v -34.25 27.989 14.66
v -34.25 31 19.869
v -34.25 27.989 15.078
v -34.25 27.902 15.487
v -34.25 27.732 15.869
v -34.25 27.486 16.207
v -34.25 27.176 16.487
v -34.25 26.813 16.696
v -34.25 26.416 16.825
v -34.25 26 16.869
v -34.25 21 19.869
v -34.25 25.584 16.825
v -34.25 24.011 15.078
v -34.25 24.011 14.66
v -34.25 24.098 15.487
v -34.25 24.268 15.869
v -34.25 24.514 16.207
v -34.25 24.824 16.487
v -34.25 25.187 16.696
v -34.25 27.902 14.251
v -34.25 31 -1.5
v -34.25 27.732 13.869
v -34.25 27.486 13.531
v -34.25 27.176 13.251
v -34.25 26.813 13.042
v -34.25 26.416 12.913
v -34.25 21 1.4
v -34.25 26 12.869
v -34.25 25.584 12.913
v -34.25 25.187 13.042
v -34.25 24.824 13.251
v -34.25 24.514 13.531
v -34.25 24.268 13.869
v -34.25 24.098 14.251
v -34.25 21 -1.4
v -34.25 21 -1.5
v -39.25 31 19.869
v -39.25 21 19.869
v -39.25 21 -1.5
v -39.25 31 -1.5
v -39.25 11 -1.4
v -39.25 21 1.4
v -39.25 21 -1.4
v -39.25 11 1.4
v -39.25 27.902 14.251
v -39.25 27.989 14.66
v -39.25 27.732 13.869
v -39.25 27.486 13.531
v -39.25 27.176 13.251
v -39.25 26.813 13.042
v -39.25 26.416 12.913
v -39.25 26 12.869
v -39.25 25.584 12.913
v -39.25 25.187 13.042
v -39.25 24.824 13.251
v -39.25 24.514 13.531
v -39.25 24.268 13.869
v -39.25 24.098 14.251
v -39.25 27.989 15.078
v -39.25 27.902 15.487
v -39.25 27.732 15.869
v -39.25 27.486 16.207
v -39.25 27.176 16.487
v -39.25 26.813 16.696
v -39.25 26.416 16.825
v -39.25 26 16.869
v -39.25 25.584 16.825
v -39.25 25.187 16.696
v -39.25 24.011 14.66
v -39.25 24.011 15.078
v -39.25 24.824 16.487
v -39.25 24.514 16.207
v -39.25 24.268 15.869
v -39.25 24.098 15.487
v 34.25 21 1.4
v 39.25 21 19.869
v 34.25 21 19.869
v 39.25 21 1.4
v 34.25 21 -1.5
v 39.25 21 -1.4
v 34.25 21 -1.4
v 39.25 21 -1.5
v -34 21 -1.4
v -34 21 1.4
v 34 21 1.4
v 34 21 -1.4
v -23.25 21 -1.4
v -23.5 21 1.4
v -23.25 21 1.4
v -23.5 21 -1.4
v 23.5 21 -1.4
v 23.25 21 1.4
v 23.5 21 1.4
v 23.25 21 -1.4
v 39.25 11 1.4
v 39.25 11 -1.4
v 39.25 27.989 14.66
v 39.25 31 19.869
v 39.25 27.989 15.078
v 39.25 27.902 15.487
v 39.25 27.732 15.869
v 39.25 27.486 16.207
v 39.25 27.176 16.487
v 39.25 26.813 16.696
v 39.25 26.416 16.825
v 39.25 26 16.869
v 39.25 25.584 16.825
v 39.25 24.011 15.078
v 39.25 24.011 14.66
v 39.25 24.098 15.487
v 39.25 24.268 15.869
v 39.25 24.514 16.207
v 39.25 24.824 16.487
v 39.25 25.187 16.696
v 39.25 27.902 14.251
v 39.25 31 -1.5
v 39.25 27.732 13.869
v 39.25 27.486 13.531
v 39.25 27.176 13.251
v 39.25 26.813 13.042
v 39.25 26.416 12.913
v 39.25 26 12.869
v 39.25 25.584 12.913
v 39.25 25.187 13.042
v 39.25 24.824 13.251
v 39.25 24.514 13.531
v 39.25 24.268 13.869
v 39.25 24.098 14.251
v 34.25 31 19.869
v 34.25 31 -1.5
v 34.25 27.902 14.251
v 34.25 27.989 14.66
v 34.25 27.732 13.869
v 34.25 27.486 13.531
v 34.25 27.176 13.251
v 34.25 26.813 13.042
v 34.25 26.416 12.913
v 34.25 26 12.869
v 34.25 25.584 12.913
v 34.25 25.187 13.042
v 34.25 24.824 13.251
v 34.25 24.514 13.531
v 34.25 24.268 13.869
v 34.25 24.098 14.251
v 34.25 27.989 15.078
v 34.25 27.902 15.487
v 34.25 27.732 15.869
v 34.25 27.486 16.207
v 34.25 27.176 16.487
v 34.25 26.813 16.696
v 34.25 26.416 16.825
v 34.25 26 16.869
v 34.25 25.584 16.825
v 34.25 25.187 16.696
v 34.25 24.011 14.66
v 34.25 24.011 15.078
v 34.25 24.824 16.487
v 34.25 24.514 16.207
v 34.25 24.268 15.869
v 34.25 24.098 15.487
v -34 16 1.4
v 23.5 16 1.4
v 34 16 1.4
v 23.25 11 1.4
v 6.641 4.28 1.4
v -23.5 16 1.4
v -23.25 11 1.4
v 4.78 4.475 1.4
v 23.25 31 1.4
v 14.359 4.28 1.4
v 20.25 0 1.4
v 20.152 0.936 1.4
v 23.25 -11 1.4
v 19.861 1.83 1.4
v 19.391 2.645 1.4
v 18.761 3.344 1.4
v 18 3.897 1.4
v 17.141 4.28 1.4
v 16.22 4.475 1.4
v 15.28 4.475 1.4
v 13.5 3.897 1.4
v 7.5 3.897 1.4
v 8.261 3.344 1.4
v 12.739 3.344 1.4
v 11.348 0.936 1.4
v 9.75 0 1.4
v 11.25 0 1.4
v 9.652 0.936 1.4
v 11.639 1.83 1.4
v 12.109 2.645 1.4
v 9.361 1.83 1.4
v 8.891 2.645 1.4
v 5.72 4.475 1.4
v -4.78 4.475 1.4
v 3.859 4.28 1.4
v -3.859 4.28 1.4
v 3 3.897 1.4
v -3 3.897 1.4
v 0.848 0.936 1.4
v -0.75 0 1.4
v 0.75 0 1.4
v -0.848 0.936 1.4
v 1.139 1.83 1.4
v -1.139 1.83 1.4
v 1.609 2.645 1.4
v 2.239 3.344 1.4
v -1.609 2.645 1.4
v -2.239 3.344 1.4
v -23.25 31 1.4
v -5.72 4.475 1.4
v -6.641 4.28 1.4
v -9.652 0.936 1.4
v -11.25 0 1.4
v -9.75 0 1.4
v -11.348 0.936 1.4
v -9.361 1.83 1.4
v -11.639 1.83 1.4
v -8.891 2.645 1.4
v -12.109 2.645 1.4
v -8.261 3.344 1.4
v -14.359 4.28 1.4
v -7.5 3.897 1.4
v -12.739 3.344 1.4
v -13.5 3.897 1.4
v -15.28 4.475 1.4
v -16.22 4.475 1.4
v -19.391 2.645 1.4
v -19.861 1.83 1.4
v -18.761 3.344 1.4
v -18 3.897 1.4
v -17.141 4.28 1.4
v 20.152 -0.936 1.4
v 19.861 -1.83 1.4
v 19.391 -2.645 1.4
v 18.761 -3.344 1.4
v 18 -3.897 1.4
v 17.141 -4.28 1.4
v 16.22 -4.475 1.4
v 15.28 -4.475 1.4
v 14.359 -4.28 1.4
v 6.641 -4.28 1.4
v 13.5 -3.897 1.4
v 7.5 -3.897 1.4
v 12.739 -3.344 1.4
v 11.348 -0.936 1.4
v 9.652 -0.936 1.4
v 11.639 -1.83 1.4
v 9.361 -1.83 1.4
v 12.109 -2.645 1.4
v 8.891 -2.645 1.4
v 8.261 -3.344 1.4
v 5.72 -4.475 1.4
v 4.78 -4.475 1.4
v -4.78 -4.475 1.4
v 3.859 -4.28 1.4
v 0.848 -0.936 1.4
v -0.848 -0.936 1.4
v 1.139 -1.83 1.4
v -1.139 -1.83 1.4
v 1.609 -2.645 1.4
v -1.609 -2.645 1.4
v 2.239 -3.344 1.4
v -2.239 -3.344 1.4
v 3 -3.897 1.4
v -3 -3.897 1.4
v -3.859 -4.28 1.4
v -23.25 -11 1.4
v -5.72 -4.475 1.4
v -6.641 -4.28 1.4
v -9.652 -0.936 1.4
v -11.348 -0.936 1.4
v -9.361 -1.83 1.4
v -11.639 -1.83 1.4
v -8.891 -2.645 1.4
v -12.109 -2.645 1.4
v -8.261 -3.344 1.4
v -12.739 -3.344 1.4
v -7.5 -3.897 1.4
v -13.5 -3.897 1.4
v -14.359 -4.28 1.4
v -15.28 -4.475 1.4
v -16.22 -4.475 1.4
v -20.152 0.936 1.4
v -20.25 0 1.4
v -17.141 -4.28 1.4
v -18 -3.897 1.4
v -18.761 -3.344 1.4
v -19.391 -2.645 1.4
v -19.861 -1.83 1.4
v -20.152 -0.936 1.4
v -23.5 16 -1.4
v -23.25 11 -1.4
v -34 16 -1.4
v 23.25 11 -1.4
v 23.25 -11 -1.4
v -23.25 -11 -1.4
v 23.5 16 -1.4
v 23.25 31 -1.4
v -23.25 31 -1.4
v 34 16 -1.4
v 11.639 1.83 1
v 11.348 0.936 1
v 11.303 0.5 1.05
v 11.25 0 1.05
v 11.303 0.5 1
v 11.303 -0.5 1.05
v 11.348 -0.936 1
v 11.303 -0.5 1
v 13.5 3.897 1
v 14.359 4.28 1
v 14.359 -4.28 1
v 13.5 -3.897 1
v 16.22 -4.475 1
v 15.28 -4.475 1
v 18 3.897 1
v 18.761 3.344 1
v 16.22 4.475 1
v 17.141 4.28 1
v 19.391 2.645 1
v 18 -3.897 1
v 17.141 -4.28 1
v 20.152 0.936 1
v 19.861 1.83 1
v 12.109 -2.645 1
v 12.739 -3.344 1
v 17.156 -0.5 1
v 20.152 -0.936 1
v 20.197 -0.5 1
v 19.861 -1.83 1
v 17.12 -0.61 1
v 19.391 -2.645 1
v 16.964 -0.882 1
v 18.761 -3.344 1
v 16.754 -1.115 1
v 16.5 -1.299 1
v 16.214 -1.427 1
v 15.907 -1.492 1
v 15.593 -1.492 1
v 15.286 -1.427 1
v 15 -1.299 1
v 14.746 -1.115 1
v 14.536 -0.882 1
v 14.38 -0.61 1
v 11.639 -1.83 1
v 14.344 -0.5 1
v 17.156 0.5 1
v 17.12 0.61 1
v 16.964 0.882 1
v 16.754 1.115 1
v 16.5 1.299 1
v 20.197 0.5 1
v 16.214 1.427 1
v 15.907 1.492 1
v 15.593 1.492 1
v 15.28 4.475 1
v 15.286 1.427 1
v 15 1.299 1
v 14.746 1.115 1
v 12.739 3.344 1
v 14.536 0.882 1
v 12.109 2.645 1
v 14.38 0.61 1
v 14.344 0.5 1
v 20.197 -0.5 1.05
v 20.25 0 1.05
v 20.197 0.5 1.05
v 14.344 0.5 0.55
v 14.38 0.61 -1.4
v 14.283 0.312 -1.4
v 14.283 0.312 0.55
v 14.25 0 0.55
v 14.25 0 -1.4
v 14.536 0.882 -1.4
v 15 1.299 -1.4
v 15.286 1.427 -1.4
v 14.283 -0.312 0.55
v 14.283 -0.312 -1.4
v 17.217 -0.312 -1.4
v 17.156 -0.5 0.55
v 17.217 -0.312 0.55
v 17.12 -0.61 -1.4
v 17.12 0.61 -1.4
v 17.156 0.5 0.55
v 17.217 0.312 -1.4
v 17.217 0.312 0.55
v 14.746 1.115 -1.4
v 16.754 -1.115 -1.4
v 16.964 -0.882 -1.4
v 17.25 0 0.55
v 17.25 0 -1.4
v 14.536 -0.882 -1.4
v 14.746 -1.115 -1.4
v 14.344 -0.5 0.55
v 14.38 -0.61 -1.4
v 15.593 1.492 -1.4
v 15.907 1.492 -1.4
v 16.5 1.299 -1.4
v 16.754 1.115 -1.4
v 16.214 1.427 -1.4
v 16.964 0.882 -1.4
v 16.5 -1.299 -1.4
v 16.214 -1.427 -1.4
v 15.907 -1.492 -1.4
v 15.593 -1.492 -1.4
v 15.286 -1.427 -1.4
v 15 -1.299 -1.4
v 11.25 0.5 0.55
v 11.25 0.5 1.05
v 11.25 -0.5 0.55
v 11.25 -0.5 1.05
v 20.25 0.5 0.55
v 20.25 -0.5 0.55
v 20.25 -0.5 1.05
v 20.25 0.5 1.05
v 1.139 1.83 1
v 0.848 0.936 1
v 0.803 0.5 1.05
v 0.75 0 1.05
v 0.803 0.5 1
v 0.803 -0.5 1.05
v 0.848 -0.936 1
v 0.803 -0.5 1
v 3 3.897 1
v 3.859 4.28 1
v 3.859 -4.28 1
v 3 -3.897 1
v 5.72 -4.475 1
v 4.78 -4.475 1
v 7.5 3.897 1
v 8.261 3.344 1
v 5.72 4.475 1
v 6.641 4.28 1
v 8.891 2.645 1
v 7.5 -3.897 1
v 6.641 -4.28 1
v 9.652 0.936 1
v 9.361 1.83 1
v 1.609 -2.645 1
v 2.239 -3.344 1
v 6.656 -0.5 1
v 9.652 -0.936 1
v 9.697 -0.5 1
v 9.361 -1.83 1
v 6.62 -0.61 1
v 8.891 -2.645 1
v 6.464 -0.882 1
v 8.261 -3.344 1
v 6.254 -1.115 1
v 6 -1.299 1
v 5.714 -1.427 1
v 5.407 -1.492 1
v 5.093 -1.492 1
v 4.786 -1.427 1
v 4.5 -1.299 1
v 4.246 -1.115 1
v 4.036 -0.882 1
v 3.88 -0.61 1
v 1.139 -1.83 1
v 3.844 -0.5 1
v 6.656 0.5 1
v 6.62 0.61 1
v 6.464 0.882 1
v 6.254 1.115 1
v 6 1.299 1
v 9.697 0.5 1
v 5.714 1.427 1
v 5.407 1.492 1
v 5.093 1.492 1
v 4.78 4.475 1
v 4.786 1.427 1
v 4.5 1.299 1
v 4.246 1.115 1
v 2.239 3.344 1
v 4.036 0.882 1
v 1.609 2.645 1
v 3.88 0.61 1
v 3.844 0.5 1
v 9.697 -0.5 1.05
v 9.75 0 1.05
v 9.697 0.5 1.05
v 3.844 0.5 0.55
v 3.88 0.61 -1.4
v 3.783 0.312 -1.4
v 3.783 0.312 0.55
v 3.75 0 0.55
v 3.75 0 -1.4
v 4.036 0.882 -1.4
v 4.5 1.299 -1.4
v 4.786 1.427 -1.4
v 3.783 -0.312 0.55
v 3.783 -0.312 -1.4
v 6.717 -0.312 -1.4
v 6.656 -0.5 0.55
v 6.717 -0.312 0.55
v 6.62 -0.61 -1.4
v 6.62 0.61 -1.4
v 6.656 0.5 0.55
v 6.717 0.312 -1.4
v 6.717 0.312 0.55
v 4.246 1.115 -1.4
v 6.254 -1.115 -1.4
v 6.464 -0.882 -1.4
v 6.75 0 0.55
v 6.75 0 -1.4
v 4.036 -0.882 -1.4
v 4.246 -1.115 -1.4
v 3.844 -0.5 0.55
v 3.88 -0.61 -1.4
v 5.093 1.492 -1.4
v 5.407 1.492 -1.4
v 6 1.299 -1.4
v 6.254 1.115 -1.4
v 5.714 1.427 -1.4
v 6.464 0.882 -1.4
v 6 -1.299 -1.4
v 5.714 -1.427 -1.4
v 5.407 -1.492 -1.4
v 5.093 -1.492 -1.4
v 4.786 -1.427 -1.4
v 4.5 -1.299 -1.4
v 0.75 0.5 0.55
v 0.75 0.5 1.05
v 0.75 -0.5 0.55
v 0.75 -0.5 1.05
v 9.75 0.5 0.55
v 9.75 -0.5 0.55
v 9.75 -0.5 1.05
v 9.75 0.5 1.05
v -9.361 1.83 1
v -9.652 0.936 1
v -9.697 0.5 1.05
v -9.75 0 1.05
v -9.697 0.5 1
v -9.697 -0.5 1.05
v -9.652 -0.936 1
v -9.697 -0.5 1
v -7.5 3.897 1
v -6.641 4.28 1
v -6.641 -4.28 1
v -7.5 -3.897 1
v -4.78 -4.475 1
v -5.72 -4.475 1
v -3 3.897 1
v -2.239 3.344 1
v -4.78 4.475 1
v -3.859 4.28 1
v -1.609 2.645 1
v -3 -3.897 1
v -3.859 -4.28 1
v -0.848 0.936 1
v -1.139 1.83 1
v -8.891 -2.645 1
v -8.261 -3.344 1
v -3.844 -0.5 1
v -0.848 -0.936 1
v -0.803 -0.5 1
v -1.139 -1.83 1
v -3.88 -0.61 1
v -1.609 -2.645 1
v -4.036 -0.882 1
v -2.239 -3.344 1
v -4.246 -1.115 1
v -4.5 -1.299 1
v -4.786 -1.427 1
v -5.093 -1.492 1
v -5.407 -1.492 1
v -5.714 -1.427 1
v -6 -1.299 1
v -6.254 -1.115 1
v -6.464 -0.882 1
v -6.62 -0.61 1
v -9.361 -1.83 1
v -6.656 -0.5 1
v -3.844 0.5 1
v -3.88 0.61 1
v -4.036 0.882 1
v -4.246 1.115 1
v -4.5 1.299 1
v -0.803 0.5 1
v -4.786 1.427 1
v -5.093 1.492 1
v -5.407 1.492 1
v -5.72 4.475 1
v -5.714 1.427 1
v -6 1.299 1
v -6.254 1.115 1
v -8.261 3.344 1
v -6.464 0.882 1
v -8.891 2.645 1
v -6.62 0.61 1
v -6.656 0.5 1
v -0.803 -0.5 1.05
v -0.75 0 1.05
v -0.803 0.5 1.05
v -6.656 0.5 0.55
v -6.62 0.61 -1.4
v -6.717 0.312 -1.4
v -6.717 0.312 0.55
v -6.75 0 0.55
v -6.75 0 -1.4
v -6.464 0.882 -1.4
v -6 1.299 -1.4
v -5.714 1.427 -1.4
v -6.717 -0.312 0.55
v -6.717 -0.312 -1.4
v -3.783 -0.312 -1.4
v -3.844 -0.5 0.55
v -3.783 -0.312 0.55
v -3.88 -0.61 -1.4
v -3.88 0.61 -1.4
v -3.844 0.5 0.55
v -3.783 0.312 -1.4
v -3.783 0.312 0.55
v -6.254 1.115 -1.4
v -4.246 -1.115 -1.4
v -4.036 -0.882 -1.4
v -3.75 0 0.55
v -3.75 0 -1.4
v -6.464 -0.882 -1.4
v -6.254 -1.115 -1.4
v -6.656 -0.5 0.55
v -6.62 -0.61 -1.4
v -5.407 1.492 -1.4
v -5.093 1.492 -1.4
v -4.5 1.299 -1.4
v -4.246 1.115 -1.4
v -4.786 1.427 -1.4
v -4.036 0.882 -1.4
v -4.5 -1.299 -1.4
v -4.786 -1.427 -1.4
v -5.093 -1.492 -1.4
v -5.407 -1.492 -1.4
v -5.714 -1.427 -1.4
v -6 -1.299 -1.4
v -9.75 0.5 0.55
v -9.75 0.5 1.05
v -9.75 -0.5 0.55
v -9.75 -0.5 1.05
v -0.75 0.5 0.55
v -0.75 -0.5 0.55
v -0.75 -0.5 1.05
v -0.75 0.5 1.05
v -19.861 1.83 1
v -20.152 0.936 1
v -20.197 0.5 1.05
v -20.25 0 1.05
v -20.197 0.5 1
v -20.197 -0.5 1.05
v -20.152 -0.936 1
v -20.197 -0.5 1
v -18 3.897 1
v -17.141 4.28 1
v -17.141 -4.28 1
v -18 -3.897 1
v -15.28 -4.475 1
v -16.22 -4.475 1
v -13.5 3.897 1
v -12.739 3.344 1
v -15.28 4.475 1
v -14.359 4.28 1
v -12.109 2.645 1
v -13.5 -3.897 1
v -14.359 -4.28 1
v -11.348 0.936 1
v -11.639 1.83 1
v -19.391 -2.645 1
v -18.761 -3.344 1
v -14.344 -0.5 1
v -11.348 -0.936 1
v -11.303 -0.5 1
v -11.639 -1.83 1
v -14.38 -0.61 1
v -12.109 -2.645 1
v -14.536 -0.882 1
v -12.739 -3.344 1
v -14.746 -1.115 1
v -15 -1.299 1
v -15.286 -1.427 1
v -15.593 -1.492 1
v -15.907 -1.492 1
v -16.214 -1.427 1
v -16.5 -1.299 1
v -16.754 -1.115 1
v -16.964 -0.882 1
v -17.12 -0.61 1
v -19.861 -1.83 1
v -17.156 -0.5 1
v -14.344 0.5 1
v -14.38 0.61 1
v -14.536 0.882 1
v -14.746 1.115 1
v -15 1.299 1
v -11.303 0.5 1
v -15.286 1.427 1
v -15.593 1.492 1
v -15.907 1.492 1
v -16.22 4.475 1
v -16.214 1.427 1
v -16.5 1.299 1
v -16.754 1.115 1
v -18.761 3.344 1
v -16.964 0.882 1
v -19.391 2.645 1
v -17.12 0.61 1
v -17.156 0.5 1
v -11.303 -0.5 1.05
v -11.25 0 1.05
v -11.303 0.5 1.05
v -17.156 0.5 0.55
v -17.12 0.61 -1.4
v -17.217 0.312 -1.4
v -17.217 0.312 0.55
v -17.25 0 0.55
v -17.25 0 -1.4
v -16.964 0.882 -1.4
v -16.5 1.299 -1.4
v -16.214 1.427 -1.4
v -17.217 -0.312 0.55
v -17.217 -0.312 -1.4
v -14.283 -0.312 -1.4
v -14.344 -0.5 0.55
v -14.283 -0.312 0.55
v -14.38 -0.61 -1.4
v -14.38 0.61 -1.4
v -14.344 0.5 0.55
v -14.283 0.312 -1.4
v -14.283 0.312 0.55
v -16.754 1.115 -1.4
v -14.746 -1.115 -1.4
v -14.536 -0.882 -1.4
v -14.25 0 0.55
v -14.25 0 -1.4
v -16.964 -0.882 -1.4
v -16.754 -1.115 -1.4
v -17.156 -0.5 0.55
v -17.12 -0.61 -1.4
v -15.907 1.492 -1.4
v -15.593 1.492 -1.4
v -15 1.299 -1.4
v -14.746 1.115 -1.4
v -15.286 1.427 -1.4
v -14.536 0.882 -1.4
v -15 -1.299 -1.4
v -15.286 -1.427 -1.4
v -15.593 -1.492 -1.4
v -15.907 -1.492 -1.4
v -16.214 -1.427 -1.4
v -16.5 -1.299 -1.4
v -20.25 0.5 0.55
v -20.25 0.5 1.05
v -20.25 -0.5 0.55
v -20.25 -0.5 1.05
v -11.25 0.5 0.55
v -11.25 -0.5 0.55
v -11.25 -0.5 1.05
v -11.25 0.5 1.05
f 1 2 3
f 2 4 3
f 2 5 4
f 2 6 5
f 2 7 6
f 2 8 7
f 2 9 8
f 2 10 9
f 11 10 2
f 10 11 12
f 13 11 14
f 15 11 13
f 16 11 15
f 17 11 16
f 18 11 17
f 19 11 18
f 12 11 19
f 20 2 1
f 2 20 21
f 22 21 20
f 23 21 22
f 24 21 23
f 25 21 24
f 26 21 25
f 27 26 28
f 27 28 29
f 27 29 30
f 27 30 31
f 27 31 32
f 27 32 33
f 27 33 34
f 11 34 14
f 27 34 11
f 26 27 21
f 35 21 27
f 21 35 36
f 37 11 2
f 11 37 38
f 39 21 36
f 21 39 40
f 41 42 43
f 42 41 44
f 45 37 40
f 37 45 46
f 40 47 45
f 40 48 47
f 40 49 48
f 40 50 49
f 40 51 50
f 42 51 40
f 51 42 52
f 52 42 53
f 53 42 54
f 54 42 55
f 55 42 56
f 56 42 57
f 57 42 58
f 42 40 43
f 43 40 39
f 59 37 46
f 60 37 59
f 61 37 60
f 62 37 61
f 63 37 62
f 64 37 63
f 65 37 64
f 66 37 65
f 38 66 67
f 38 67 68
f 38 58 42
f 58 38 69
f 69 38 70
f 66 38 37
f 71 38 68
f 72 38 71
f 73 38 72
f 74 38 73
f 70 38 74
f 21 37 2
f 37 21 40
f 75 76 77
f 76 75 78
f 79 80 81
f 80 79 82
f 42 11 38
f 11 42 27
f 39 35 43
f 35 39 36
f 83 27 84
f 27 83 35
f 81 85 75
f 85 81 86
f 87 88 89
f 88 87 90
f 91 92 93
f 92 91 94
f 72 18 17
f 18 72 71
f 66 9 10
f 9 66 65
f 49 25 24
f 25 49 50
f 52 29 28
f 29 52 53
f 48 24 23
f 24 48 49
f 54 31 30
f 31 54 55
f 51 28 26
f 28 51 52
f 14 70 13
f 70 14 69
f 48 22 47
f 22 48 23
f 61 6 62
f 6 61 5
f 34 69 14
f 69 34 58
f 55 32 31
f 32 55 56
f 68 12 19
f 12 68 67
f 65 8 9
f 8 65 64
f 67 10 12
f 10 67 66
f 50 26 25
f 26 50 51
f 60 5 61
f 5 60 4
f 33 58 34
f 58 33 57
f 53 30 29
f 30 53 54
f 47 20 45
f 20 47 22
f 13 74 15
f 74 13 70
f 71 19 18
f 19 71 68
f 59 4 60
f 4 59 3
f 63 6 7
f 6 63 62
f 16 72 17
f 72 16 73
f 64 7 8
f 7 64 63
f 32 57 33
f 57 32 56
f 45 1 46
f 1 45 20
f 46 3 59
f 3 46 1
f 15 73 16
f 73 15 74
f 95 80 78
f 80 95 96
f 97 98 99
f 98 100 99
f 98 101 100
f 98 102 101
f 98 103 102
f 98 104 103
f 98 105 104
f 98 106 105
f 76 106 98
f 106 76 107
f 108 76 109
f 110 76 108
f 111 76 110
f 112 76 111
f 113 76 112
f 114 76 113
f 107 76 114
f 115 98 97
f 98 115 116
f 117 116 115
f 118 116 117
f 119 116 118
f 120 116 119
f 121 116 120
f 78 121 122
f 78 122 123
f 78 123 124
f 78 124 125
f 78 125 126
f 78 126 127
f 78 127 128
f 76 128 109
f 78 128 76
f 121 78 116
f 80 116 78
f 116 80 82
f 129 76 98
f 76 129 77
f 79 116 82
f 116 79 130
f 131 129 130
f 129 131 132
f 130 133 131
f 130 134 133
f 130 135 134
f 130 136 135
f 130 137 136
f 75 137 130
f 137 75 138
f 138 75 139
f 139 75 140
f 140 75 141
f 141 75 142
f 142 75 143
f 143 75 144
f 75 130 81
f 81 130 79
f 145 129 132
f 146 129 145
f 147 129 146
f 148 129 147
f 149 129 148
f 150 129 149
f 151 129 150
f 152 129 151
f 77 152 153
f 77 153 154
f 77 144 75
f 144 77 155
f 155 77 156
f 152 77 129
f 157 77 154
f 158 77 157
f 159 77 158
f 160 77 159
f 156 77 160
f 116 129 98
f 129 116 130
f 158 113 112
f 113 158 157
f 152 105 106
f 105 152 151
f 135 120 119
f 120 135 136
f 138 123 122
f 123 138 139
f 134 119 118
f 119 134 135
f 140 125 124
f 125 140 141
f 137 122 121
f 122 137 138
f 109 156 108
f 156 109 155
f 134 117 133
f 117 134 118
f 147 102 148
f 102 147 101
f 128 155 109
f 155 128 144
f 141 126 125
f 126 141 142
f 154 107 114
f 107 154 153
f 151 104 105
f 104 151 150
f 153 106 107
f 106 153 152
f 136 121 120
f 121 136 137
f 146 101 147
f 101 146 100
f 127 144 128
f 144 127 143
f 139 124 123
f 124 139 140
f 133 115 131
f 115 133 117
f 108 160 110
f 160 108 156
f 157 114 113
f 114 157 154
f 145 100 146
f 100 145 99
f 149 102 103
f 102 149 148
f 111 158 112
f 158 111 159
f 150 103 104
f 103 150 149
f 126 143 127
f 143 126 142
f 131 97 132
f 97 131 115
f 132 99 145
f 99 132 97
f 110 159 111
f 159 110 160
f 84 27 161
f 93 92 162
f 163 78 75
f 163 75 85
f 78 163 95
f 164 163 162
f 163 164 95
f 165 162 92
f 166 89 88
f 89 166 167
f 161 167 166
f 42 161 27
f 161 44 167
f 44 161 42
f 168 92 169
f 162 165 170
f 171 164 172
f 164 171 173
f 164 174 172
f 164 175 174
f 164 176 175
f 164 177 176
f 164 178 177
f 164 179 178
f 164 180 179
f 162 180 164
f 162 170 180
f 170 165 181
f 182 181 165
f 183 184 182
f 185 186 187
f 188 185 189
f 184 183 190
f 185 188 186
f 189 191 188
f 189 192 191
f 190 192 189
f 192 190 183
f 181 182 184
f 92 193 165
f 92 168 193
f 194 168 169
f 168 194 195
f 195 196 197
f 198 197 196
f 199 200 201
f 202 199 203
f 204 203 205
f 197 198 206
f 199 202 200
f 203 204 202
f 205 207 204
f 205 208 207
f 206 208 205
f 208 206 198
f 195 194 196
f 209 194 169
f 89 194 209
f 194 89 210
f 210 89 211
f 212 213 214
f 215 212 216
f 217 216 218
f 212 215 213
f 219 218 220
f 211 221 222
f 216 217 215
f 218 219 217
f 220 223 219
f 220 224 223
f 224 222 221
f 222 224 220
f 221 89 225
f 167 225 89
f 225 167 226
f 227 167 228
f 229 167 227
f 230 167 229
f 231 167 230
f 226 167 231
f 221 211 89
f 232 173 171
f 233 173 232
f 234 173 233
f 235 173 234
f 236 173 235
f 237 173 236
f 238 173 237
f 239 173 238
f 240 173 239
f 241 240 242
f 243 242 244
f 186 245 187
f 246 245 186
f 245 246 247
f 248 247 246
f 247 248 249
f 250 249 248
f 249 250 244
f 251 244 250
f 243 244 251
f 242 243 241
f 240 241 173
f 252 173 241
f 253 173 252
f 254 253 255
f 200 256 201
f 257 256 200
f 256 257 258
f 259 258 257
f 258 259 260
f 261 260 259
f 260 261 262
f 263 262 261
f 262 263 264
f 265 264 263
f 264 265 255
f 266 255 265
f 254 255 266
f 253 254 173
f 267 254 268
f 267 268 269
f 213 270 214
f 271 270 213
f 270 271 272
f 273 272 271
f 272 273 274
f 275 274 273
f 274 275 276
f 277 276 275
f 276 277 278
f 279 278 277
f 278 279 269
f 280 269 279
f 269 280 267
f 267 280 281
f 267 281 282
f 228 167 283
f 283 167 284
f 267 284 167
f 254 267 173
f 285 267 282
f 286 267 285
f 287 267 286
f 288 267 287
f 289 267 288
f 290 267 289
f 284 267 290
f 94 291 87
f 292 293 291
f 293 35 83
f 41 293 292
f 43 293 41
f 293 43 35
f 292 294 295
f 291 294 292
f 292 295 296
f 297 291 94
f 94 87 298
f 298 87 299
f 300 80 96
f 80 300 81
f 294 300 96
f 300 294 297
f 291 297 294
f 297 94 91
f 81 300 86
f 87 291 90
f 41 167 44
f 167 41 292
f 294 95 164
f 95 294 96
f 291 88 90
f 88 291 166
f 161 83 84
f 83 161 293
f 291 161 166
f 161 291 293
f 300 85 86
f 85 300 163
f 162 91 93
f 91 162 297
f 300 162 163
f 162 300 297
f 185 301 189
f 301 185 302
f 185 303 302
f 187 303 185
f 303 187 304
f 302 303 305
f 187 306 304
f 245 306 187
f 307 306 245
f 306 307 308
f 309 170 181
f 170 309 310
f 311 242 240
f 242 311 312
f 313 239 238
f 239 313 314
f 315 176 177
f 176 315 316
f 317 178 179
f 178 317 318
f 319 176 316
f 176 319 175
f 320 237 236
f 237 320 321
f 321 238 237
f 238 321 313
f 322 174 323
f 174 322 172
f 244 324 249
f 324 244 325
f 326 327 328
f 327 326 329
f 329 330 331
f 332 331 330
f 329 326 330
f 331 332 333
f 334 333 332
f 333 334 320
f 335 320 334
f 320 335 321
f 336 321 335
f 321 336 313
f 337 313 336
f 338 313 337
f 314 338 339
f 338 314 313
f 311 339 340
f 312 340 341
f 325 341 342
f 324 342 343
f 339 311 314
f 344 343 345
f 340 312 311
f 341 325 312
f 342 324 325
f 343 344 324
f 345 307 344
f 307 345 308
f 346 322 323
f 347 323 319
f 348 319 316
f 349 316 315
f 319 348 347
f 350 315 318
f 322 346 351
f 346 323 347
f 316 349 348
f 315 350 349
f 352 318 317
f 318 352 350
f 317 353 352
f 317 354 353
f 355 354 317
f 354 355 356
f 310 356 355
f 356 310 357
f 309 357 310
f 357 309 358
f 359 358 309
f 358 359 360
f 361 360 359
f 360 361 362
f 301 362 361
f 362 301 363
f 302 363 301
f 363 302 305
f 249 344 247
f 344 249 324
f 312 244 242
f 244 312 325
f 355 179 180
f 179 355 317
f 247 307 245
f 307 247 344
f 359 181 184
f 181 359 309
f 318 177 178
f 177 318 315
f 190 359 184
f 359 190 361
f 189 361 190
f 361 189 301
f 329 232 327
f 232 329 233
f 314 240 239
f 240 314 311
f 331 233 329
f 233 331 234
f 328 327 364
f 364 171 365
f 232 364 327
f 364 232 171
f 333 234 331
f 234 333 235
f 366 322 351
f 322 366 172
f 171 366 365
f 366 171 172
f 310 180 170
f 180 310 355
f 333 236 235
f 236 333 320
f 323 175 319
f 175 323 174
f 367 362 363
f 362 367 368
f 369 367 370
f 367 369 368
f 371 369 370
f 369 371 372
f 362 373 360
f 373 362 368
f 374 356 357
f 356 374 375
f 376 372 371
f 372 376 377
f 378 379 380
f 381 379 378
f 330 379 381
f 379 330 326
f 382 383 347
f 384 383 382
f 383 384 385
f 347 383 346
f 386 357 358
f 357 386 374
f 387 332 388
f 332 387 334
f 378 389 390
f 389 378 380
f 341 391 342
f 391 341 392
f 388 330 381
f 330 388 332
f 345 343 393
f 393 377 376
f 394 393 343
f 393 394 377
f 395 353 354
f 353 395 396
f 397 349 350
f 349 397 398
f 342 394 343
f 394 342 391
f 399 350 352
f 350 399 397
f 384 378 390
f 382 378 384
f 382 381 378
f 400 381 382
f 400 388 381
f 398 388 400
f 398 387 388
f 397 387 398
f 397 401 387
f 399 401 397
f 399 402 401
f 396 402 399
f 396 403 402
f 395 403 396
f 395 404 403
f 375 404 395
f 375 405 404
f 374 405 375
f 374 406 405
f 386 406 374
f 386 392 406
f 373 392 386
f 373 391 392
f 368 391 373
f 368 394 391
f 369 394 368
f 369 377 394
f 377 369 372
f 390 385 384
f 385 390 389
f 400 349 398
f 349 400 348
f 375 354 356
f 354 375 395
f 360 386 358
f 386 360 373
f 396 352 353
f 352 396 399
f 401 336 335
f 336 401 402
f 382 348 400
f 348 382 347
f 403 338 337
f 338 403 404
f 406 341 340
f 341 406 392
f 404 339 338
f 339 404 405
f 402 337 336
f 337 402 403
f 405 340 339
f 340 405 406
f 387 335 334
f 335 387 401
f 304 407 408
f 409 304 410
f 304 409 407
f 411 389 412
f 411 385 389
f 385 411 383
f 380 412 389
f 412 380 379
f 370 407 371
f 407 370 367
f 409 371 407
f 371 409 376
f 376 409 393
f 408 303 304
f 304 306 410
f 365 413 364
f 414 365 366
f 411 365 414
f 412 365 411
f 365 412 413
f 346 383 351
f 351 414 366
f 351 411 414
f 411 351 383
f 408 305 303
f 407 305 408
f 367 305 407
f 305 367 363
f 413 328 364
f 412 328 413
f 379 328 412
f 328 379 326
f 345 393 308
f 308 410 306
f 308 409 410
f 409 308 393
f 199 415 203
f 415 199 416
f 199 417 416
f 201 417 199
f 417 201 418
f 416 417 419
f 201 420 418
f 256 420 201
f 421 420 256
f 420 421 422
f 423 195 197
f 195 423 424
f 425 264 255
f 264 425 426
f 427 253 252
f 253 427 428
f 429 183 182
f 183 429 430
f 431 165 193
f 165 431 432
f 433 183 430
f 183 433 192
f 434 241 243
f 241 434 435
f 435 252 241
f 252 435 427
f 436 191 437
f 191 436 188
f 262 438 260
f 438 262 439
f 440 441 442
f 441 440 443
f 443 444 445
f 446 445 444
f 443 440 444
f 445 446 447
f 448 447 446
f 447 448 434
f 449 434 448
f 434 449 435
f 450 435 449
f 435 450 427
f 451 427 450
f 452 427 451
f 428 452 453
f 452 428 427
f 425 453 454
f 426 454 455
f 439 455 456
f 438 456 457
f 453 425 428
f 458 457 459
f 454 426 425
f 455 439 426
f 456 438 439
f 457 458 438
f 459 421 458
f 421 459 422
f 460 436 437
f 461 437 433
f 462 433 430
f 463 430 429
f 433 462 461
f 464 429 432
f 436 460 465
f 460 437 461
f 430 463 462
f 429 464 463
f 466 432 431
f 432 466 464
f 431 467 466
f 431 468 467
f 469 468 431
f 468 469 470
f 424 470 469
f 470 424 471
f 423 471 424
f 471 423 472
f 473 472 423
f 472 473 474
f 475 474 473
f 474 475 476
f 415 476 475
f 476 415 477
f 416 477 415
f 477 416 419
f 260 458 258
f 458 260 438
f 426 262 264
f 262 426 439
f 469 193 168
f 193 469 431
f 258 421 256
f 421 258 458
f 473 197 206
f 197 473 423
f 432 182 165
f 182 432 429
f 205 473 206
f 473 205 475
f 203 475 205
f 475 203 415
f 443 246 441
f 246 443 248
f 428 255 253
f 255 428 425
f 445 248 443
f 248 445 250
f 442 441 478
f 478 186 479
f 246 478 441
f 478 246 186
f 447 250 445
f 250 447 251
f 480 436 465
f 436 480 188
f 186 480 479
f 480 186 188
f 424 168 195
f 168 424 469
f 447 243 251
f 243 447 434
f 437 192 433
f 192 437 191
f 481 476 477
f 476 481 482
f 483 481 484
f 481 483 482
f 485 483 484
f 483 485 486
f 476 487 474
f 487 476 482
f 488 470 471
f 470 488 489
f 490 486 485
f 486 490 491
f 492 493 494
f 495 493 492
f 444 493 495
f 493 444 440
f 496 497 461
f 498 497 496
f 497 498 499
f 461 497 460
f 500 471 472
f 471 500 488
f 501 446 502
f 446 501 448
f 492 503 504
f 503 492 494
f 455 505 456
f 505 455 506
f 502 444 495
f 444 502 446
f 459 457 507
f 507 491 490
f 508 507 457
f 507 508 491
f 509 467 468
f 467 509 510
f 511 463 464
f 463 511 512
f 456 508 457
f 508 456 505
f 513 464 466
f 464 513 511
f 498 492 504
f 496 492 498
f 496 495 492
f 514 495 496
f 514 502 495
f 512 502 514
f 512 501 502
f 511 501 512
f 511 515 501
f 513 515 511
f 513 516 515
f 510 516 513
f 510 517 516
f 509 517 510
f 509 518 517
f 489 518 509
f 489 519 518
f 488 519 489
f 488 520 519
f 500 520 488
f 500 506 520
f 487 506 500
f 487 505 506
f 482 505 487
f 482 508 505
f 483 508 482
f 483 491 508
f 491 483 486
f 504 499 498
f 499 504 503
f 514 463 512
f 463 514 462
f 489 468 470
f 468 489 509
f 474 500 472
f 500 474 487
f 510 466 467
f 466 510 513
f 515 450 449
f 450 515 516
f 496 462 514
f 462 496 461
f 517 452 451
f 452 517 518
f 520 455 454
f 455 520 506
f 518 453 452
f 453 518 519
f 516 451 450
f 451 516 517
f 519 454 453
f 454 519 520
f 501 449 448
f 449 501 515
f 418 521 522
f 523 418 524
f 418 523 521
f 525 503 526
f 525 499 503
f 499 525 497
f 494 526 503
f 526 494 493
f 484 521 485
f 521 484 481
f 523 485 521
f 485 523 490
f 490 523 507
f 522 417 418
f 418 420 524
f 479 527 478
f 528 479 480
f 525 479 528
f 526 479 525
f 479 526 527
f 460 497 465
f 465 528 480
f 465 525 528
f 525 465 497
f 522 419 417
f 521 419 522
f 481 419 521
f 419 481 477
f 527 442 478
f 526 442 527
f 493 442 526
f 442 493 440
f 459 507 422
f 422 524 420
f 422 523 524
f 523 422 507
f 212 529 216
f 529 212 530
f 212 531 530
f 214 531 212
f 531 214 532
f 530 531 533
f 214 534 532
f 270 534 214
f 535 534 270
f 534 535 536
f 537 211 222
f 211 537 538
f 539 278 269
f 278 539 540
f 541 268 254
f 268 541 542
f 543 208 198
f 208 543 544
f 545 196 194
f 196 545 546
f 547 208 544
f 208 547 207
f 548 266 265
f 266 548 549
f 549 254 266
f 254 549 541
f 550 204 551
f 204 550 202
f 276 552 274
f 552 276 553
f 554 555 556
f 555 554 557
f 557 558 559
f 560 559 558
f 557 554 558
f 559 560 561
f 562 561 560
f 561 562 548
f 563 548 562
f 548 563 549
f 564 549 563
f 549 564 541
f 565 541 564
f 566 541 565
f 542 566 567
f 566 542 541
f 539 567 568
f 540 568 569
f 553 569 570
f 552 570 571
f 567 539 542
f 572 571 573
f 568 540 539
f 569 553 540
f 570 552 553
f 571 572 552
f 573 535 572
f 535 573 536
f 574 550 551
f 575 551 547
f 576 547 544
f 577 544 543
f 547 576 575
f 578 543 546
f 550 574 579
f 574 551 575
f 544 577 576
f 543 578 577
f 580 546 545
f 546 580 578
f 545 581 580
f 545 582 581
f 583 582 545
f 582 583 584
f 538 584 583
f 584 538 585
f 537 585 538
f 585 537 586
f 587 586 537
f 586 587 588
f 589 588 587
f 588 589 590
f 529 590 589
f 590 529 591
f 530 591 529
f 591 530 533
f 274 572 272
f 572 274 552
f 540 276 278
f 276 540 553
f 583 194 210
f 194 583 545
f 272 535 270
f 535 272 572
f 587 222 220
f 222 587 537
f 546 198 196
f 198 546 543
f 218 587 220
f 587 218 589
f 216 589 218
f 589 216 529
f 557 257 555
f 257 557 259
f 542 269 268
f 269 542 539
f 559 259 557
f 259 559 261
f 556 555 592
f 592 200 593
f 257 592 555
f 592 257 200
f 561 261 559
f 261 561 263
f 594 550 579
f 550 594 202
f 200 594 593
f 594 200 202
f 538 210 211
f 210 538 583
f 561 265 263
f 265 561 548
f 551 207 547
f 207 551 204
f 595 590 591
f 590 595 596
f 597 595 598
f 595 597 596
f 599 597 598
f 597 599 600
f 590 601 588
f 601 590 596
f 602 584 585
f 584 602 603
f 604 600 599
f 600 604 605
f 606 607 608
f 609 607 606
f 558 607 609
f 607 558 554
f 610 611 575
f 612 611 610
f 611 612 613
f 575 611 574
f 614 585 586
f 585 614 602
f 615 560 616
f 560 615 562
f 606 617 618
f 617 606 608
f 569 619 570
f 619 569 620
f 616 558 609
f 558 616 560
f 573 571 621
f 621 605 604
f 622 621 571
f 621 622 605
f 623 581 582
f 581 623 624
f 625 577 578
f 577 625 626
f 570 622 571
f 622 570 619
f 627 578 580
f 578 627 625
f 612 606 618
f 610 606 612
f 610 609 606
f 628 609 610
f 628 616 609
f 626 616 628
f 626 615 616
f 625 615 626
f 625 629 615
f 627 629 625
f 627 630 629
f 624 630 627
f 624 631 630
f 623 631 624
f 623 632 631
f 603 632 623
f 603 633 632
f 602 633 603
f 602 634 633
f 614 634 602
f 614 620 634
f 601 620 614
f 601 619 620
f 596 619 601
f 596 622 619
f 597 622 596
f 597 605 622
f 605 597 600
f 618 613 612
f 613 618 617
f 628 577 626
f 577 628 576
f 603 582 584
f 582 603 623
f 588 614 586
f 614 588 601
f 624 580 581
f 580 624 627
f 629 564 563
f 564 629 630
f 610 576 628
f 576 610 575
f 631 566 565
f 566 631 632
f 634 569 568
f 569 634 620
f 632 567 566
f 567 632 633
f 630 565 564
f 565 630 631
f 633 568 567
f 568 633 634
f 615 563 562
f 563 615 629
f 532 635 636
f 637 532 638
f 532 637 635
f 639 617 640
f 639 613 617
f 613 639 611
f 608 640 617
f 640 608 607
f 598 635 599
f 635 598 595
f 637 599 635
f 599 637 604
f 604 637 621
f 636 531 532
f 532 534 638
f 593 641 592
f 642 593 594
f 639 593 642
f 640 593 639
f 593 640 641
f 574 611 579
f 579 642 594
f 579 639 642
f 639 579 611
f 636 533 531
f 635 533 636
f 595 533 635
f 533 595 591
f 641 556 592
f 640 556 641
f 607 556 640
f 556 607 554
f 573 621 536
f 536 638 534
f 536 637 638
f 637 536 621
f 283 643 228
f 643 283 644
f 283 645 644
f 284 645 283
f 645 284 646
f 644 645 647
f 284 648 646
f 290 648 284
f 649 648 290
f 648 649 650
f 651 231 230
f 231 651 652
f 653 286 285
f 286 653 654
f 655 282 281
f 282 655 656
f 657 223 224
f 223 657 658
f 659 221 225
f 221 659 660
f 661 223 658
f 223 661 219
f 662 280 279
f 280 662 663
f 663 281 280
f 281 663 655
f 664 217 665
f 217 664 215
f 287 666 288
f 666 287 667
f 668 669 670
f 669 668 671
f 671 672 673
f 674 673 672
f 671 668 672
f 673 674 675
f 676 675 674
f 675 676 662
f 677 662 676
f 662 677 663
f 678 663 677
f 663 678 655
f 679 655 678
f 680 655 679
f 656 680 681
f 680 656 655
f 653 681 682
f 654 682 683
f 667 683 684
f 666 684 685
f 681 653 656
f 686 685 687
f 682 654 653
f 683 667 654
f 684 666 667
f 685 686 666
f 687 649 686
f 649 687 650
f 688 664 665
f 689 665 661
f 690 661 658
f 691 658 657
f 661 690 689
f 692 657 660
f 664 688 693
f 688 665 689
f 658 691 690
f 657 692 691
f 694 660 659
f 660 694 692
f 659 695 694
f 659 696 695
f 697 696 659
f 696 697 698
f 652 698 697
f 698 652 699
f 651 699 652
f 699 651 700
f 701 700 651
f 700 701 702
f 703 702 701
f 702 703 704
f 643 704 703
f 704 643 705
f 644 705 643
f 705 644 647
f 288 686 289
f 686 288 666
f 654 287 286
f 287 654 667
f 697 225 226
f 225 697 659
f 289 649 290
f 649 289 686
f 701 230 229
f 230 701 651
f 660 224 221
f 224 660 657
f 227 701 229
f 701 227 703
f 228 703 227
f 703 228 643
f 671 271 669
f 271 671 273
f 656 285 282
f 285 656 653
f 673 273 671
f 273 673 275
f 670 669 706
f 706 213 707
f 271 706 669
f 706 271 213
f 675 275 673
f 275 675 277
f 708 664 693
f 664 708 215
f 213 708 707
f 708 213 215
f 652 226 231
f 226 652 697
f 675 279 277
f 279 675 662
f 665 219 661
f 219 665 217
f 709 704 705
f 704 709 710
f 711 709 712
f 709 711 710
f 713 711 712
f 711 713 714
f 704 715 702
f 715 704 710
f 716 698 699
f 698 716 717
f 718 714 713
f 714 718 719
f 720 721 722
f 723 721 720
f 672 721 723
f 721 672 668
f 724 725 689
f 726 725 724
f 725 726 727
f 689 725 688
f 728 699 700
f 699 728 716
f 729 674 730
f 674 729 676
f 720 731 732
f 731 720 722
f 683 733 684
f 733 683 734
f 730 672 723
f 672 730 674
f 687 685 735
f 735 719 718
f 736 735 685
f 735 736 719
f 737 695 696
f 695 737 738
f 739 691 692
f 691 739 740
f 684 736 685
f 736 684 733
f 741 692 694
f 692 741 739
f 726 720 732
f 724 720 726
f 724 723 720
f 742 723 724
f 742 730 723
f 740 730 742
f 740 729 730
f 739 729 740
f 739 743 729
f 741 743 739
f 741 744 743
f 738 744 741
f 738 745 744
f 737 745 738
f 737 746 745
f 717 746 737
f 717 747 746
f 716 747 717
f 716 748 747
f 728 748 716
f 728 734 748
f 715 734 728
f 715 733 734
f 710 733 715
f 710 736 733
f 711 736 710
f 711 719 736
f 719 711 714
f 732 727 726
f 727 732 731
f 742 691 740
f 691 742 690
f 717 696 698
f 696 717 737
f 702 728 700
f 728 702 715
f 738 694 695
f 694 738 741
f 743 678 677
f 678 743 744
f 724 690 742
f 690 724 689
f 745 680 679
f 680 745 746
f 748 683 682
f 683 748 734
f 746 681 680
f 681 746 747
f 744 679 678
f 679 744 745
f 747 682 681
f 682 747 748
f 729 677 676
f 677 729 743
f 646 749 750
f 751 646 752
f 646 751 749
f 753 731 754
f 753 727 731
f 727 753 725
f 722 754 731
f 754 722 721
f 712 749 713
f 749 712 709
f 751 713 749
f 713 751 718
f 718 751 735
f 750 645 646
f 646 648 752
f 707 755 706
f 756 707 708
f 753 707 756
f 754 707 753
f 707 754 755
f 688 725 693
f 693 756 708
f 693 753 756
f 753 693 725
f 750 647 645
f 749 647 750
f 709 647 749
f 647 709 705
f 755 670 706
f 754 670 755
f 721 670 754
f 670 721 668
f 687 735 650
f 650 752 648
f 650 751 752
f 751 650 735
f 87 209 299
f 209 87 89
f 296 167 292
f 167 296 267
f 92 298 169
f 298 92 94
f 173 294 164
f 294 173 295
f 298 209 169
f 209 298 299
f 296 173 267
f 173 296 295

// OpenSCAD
module hole()
{
  union()
  { 
     cylinder(h=0.4,r=4.5,center=true,$fs=0.1);
     translate(v=[0,0,1.4])
       cylinder(h=2.4,r=1.5,center=true,$fs=0.1);
     translate(v=[0,0,0.4]) 
       cube(size=[9,1,0.5],center=true);
  }
}

module pillar()
{
  difference()
  {
    cube(size=[5,10,3+84/(2*3.1415926535)+5],center=true);

    translate(v=[0,0,(3+84/(2*3.1415926535)+5)/2-5])
      rotate([0,90,0])
        cylinder(h=6,r=2,center=true,$fs=0.1);
  }
}

module cogmount()
{
  difference()
  {
    union()
    {
      cube(size=[6*(6+4.5)+4.5+1+10,10,2.8],center=true);

      translate(v=[-(6*(6+4.5)+4.5+1)/2-2.5,10,(3+84/(2*3.1415926535)+5)/2-1.5])
        pillar();

      translate(v=[(6*(6+4.5)+4.5+1)/2+2.5,10,(3+84/(2*3.1415926535)+5)/2-1.5])
        pillar();
    }

    union()
    {
      translate(v=[-(6*(6+4.5)+4.5)/2+5,+2.5,0])
        cube(size=[10.5,5,2.8],center=true);
      translate(v=[(6*(6+4.5)+4.5)/2-5,+2.5,0])
        cube(size=[10.5,5,2.8],center=true);
    }
  }
}

union()
{

translate(v=[0,4*(6+4.5)/2-5,0])
  cogmount();

rotate([0,180,0])
{
difference()
{
  translate(v=[0,10,0])
    cube(size=[4*(6+4.5)+4.5,4*(6+4.5),2.8],center=true);
  translate(v=[-15.75,0,-1.2])
    hole();
  translate(v=[-5.25,0,-1.2])
    hole();
  translate(v=[5.25,0,-1.2])
    hole();
  translate(v=[15.75,0,-1.2])
    hole();
}
}

}
